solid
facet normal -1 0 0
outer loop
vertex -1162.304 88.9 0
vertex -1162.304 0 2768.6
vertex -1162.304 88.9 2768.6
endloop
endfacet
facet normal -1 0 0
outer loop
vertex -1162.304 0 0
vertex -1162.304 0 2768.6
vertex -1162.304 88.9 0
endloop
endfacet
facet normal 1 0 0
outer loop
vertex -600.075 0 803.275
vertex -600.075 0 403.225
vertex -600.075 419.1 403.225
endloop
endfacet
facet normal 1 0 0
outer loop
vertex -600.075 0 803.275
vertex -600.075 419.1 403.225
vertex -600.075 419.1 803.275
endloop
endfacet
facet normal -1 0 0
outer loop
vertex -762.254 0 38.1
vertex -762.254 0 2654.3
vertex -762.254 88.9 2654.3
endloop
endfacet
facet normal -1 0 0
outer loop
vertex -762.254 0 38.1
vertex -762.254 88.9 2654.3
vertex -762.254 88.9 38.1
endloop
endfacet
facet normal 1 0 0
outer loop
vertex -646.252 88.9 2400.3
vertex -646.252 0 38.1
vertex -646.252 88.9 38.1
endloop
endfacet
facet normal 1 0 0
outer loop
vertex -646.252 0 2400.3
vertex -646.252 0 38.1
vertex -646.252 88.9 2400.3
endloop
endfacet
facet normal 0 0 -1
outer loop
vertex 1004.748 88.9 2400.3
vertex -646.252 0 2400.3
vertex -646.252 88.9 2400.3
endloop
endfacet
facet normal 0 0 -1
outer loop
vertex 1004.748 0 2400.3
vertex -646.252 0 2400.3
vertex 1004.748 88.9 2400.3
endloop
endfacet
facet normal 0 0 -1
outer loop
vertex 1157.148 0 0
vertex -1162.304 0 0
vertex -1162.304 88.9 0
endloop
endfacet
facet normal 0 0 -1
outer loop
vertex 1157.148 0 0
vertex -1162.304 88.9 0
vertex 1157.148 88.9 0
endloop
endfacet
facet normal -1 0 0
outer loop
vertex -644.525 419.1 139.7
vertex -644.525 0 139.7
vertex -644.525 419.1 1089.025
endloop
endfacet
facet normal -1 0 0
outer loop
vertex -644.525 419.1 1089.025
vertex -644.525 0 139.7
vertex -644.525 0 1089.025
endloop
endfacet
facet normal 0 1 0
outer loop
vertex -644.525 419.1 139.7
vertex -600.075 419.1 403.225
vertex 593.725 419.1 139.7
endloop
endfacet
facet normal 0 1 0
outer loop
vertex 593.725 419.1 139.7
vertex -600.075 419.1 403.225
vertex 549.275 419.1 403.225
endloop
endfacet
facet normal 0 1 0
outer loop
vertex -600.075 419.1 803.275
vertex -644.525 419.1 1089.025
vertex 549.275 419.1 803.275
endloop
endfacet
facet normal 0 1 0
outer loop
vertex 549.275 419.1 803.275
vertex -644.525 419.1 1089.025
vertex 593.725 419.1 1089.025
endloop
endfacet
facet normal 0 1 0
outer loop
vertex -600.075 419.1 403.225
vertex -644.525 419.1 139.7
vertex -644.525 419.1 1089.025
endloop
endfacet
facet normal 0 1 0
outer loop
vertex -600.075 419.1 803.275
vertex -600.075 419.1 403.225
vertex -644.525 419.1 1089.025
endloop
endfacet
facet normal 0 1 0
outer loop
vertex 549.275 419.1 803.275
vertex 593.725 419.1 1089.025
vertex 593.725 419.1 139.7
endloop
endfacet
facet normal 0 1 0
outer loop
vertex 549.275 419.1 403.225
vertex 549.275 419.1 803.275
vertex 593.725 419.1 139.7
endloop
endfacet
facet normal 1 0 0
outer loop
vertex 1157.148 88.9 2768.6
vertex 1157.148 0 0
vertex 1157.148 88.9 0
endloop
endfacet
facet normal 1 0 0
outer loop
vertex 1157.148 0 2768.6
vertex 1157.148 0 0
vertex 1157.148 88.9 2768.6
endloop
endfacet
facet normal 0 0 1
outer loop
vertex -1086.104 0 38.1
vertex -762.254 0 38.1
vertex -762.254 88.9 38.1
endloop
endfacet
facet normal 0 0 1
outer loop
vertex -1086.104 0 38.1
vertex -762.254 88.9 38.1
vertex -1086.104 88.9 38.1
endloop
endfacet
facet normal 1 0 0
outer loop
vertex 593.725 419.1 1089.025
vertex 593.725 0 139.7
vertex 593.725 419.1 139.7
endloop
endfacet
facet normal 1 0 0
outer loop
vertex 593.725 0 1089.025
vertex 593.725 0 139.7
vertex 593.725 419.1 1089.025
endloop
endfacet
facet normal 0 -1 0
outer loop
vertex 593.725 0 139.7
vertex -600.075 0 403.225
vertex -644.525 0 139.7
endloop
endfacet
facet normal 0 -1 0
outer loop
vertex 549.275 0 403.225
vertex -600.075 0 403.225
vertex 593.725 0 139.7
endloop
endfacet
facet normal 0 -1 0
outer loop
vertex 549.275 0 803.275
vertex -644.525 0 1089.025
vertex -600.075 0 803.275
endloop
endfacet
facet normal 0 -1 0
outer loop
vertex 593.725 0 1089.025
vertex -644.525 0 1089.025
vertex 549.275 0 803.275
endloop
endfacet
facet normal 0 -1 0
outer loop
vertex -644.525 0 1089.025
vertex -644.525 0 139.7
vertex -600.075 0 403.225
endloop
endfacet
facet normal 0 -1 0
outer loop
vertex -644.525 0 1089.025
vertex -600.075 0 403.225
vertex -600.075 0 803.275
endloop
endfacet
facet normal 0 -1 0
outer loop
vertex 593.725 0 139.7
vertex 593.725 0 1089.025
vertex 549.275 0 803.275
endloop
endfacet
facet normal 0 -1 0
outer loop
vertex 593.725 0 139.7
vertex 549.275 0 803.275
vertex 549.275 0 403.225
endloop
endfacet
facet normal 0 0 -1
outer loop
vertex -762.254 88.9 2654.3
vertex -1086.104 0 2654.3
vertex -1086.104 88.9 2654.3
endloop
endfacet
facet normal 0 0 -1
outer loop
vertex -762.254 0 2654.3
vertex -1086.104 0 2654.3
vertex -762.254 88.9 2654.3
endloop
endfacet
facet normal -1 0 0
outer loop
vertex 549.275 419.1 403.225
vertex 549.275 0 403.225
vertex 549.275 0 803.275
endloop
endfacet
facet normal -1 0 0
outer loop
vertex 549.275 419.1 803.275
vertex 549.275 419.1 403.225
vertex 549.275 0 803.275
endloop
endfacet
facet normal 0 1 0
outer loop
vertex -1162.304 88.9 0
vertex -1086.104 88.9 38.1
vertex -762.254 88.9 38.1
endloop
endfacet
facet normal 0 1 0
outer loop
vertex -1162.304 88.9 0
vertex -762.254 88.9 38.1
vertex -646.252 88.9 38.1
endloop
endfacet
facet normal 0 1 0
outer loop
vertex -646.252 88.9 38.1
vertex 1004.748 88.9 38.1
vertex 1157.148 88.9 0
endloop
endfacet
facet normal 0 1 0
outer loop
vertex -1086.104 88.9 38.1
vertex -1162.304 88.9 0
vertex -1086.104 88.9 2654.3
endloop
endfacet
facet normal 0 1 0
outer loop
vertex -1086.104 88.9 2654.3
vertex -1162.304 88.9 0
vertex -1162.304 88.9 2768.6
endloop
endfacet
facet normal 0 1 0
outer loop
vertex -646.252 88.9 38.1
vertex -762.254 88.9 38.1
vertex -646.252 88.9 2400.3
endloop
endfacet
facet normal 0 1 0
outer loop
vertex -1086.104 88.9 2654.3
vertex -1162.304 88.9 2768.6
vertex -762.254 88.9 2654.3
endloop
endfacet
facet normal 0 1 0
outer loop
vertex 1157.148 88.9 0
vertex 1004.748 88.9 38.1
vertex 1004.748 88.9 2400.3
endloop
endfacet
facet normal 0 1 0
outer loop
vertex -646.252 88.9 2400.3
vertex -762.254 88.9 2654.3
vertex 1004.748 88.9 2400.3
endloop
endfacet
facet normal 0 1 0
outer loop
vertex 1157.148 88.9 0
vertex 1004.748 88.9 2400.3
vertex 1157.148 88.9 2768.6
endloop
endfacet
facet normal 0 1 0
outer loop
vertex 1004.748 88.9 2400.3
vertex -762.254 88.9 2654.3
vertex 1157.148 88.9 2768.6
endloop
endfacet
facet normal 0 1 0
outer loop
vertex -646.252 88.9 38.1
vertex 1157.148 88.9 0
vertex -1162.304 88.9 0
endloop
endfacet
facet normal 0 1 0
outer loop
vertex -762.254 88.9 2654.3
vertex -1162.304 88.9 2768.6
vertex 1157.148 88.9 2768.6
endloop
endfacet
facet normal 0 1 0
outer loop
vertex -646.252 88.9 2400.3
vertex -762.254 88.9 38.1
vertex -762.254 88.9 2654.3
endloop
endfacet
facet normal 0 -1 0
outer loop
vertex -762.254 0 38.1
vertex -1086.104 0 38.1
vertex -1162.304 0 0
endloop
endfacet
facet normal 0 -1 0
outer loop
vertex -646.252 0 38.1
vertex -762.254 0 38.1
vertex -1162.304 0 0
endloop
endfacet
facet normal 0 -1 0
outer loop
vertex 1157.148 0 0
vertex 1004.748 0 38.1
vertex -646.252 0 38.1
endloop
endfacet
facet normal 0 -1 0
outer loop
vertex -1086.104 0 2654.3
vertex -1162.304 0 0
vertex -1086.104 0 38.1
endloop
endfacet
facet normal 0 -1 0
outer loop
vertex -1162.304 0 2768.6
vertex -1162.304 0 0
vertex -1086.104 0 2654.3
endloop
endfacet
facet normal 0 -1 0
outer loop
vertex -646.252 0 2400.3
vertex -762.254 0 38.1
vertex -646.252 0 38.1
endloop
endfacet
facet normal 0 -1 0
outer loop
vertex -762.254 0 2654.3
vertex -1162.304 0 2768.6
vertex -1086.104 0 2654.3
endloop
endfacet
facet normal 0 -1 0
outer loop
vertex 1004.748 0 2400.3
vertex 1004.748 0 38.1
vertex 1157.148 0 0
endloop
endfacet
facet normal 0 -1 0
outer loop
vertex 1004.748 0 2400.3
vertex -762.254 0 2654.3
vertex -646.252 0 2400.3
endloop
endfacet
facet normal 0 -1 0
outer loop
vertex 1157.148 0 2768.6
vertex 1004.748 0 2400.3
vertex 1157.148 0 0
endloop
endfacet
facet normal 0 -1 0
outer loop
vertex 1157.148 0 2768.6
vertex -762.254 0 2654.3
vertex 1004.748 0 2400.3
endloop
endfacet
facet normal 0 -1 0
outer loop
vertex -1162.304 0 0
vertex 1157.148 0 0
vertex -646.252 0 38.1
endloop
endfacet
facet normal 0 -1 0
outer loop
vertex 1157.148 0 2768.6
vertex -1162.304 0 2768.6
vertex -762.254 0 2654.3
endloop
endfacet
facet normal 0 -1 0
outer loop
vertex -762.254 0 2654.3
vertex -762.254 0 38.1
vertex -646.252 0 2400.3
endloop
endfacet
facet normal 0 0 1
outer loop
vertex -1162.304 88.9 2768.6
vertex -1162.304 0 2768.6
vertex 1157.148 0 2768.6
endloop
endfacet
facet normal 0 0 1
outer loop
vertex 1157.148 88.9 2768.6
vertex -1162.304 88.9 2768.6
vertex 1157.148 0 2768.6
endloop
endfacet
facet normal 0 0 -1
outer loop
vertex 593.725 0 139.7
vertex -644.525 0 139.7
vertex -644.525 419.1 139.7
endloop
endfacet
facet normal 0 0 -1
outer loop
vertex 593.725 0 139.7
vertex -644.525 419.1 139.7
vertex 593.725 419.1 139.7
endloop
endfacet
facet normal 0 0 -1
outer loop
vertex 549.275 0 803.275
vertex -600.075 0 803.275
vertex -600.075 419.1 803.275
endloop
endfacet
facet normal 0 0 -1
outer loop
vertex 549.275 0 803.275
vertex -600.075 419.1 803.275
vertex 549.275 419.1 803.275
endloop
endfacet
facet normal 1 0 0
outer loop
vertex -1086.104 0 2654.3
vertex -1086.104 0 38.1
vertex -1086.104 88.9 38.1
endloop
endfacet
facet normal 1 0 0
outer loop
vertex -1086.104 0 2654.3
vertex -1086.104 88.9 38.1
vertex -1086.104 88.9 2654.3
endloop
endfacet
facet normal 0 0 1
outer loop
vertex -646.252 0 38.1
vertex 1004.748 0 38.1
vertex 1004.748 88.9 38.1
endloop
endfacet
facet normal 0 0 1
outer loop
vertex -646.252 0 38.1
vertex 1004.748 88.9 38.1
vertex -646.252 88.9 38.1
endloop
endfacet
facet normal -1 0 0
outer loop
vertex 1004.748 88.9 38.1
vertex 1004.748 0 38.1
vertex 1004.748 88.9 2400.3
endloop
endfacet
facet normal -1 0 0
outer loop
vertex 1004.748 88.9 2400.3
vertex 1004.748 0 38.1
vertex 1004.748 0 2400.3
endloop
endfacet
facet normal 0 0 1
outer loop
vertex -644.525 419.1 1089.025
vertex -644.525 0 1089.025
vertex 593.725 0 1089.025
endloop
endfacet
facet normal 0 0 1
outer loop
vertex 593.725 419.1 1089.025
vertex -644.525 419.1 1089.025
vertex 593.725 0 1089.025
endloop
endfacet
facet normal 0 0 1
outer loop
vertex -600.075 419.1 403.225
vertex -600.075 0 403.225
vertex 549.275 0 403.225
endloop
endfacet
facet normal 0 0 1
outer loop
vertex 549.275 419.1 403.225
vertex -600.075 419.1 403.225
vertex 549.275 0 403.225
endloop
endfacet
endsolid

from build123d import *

# Parameters (mm, degrees)
F0_W     = 1238.25
F0_H     = 949.325
F0_W_2   = 1149.35
F0_H_2   = 400.05
F2_DEPTH = 419.1
F1_W     = 38.1
F1_H     = 2616.2
F1_H_2   = 2362.2
F1_W_2   = 2319.452508
F1_H_3   = 38.1
F1_W_3   = 39.802508
F3_DEPTH = 88.9


with BuildPart() as f2:
    # F0 (on Front) → F2 (new body)
    with BuildSketch(Plane.XZ):
        with Locations((0, 474.6625)):
            Rectangle(F0_W, F0_H)
        with Locations((0, 463.55)):
            Rectangle(F0_W_2, F0_H_2, mode=Mode.SUBTRACT)
    extrude(amount=-F2_DEPTH)


with BuildPart() as f3:
    # F1 (on Front) → F3 (new body)
    with BuildSketch(Plane.XZ):
        Polygon((1004.748238, 38.1), (-646.251762, 38.1), (-684.351762, 38.1), (-724.15427, 38.1), (-762.25427, 38.1), (-1086.10427, 38.1), (-1124.20427, 38.1), (-1162.30427, 38.1), (-1162.30427, 0), (1157.148238, 0), (1157.148238, 38.1), (1119.048238, 38.1), (1080.948238, 38.1), (1042.848238, 38.1), align=None)
        with Locations((1138.098238, 1346.2)):
            Rectangle(F1_W, F1_H)
        Polygon((1080.948238, 2400.3), (1080.948238, 38.1), (1119.048238, 38.1), (1119.048238, 2654.3), (1080.948238, 2654.3), align=None)
        with Locations((1061.898238, 1219.2)):
            Rectangle(F1_W, F1_H_2)
        with Locations((1023.798238, 1219.2)):
            Rectangle(F1_W, F1_H_2)
        with Locations((-2.578016, 2749.55)):
            Rectangle(F1_W_2, F1_H_3)
        with Locations((-2.578016, 2711.45)):
            Rectangle(F1_W_2, F1_H_3)
        Polygon((-762.25427, 2654.3), (-724.15427, 2654.3), (1080.948238, 2654.3), (1119.048238, 2654.3), (1157.148238, 2654.3), (1157.148238, 2692.4), (-1162.30427, 2692.4), (-1162.30427, 2654.3), (-1124.20427, 2654.3), (-1086.10427, 2654.3), align=None)
        Polygon((-684.351762, 2400.3), (-646.251762, 2400.3), (1004.748238, 2400.3), (1042.848238, 2400.3), (1080.948238, 2400.3), (1080.948238, 2654.3), (-724.15427, 2654.3), (-724.15427, 2400.3), align=None)
        with Locations((-665.301762, 1219.2)):
            Rectangle(F1_W, F1_H_2)
        with Locations((-704.253016, 1219.2)):
            Rectangle(F1_W_3, F1_H_2)
        Polygon((-762.25427, 38.1), (-724.15427, 38.1), (-724.15427, 2400.3), (-724.15427, 2654.3), (-762.25427, 2654.3), align=None)
        with Locations((-1105.15427, 1346.2)):
            Rectangle(F1_W, F1_H)
        with Locations((-1143.25427, 1346.2)):
            Rectangle(F1_W, F1_H)
    extrude(amount=-F3_DEPTH)


with BuildPart() as f2_1:
    # F4: moved
    add(f2.part.moved(Location((-25.4, 0, 139.7))))


solid = Compound([f3.part, f2_1.part])
